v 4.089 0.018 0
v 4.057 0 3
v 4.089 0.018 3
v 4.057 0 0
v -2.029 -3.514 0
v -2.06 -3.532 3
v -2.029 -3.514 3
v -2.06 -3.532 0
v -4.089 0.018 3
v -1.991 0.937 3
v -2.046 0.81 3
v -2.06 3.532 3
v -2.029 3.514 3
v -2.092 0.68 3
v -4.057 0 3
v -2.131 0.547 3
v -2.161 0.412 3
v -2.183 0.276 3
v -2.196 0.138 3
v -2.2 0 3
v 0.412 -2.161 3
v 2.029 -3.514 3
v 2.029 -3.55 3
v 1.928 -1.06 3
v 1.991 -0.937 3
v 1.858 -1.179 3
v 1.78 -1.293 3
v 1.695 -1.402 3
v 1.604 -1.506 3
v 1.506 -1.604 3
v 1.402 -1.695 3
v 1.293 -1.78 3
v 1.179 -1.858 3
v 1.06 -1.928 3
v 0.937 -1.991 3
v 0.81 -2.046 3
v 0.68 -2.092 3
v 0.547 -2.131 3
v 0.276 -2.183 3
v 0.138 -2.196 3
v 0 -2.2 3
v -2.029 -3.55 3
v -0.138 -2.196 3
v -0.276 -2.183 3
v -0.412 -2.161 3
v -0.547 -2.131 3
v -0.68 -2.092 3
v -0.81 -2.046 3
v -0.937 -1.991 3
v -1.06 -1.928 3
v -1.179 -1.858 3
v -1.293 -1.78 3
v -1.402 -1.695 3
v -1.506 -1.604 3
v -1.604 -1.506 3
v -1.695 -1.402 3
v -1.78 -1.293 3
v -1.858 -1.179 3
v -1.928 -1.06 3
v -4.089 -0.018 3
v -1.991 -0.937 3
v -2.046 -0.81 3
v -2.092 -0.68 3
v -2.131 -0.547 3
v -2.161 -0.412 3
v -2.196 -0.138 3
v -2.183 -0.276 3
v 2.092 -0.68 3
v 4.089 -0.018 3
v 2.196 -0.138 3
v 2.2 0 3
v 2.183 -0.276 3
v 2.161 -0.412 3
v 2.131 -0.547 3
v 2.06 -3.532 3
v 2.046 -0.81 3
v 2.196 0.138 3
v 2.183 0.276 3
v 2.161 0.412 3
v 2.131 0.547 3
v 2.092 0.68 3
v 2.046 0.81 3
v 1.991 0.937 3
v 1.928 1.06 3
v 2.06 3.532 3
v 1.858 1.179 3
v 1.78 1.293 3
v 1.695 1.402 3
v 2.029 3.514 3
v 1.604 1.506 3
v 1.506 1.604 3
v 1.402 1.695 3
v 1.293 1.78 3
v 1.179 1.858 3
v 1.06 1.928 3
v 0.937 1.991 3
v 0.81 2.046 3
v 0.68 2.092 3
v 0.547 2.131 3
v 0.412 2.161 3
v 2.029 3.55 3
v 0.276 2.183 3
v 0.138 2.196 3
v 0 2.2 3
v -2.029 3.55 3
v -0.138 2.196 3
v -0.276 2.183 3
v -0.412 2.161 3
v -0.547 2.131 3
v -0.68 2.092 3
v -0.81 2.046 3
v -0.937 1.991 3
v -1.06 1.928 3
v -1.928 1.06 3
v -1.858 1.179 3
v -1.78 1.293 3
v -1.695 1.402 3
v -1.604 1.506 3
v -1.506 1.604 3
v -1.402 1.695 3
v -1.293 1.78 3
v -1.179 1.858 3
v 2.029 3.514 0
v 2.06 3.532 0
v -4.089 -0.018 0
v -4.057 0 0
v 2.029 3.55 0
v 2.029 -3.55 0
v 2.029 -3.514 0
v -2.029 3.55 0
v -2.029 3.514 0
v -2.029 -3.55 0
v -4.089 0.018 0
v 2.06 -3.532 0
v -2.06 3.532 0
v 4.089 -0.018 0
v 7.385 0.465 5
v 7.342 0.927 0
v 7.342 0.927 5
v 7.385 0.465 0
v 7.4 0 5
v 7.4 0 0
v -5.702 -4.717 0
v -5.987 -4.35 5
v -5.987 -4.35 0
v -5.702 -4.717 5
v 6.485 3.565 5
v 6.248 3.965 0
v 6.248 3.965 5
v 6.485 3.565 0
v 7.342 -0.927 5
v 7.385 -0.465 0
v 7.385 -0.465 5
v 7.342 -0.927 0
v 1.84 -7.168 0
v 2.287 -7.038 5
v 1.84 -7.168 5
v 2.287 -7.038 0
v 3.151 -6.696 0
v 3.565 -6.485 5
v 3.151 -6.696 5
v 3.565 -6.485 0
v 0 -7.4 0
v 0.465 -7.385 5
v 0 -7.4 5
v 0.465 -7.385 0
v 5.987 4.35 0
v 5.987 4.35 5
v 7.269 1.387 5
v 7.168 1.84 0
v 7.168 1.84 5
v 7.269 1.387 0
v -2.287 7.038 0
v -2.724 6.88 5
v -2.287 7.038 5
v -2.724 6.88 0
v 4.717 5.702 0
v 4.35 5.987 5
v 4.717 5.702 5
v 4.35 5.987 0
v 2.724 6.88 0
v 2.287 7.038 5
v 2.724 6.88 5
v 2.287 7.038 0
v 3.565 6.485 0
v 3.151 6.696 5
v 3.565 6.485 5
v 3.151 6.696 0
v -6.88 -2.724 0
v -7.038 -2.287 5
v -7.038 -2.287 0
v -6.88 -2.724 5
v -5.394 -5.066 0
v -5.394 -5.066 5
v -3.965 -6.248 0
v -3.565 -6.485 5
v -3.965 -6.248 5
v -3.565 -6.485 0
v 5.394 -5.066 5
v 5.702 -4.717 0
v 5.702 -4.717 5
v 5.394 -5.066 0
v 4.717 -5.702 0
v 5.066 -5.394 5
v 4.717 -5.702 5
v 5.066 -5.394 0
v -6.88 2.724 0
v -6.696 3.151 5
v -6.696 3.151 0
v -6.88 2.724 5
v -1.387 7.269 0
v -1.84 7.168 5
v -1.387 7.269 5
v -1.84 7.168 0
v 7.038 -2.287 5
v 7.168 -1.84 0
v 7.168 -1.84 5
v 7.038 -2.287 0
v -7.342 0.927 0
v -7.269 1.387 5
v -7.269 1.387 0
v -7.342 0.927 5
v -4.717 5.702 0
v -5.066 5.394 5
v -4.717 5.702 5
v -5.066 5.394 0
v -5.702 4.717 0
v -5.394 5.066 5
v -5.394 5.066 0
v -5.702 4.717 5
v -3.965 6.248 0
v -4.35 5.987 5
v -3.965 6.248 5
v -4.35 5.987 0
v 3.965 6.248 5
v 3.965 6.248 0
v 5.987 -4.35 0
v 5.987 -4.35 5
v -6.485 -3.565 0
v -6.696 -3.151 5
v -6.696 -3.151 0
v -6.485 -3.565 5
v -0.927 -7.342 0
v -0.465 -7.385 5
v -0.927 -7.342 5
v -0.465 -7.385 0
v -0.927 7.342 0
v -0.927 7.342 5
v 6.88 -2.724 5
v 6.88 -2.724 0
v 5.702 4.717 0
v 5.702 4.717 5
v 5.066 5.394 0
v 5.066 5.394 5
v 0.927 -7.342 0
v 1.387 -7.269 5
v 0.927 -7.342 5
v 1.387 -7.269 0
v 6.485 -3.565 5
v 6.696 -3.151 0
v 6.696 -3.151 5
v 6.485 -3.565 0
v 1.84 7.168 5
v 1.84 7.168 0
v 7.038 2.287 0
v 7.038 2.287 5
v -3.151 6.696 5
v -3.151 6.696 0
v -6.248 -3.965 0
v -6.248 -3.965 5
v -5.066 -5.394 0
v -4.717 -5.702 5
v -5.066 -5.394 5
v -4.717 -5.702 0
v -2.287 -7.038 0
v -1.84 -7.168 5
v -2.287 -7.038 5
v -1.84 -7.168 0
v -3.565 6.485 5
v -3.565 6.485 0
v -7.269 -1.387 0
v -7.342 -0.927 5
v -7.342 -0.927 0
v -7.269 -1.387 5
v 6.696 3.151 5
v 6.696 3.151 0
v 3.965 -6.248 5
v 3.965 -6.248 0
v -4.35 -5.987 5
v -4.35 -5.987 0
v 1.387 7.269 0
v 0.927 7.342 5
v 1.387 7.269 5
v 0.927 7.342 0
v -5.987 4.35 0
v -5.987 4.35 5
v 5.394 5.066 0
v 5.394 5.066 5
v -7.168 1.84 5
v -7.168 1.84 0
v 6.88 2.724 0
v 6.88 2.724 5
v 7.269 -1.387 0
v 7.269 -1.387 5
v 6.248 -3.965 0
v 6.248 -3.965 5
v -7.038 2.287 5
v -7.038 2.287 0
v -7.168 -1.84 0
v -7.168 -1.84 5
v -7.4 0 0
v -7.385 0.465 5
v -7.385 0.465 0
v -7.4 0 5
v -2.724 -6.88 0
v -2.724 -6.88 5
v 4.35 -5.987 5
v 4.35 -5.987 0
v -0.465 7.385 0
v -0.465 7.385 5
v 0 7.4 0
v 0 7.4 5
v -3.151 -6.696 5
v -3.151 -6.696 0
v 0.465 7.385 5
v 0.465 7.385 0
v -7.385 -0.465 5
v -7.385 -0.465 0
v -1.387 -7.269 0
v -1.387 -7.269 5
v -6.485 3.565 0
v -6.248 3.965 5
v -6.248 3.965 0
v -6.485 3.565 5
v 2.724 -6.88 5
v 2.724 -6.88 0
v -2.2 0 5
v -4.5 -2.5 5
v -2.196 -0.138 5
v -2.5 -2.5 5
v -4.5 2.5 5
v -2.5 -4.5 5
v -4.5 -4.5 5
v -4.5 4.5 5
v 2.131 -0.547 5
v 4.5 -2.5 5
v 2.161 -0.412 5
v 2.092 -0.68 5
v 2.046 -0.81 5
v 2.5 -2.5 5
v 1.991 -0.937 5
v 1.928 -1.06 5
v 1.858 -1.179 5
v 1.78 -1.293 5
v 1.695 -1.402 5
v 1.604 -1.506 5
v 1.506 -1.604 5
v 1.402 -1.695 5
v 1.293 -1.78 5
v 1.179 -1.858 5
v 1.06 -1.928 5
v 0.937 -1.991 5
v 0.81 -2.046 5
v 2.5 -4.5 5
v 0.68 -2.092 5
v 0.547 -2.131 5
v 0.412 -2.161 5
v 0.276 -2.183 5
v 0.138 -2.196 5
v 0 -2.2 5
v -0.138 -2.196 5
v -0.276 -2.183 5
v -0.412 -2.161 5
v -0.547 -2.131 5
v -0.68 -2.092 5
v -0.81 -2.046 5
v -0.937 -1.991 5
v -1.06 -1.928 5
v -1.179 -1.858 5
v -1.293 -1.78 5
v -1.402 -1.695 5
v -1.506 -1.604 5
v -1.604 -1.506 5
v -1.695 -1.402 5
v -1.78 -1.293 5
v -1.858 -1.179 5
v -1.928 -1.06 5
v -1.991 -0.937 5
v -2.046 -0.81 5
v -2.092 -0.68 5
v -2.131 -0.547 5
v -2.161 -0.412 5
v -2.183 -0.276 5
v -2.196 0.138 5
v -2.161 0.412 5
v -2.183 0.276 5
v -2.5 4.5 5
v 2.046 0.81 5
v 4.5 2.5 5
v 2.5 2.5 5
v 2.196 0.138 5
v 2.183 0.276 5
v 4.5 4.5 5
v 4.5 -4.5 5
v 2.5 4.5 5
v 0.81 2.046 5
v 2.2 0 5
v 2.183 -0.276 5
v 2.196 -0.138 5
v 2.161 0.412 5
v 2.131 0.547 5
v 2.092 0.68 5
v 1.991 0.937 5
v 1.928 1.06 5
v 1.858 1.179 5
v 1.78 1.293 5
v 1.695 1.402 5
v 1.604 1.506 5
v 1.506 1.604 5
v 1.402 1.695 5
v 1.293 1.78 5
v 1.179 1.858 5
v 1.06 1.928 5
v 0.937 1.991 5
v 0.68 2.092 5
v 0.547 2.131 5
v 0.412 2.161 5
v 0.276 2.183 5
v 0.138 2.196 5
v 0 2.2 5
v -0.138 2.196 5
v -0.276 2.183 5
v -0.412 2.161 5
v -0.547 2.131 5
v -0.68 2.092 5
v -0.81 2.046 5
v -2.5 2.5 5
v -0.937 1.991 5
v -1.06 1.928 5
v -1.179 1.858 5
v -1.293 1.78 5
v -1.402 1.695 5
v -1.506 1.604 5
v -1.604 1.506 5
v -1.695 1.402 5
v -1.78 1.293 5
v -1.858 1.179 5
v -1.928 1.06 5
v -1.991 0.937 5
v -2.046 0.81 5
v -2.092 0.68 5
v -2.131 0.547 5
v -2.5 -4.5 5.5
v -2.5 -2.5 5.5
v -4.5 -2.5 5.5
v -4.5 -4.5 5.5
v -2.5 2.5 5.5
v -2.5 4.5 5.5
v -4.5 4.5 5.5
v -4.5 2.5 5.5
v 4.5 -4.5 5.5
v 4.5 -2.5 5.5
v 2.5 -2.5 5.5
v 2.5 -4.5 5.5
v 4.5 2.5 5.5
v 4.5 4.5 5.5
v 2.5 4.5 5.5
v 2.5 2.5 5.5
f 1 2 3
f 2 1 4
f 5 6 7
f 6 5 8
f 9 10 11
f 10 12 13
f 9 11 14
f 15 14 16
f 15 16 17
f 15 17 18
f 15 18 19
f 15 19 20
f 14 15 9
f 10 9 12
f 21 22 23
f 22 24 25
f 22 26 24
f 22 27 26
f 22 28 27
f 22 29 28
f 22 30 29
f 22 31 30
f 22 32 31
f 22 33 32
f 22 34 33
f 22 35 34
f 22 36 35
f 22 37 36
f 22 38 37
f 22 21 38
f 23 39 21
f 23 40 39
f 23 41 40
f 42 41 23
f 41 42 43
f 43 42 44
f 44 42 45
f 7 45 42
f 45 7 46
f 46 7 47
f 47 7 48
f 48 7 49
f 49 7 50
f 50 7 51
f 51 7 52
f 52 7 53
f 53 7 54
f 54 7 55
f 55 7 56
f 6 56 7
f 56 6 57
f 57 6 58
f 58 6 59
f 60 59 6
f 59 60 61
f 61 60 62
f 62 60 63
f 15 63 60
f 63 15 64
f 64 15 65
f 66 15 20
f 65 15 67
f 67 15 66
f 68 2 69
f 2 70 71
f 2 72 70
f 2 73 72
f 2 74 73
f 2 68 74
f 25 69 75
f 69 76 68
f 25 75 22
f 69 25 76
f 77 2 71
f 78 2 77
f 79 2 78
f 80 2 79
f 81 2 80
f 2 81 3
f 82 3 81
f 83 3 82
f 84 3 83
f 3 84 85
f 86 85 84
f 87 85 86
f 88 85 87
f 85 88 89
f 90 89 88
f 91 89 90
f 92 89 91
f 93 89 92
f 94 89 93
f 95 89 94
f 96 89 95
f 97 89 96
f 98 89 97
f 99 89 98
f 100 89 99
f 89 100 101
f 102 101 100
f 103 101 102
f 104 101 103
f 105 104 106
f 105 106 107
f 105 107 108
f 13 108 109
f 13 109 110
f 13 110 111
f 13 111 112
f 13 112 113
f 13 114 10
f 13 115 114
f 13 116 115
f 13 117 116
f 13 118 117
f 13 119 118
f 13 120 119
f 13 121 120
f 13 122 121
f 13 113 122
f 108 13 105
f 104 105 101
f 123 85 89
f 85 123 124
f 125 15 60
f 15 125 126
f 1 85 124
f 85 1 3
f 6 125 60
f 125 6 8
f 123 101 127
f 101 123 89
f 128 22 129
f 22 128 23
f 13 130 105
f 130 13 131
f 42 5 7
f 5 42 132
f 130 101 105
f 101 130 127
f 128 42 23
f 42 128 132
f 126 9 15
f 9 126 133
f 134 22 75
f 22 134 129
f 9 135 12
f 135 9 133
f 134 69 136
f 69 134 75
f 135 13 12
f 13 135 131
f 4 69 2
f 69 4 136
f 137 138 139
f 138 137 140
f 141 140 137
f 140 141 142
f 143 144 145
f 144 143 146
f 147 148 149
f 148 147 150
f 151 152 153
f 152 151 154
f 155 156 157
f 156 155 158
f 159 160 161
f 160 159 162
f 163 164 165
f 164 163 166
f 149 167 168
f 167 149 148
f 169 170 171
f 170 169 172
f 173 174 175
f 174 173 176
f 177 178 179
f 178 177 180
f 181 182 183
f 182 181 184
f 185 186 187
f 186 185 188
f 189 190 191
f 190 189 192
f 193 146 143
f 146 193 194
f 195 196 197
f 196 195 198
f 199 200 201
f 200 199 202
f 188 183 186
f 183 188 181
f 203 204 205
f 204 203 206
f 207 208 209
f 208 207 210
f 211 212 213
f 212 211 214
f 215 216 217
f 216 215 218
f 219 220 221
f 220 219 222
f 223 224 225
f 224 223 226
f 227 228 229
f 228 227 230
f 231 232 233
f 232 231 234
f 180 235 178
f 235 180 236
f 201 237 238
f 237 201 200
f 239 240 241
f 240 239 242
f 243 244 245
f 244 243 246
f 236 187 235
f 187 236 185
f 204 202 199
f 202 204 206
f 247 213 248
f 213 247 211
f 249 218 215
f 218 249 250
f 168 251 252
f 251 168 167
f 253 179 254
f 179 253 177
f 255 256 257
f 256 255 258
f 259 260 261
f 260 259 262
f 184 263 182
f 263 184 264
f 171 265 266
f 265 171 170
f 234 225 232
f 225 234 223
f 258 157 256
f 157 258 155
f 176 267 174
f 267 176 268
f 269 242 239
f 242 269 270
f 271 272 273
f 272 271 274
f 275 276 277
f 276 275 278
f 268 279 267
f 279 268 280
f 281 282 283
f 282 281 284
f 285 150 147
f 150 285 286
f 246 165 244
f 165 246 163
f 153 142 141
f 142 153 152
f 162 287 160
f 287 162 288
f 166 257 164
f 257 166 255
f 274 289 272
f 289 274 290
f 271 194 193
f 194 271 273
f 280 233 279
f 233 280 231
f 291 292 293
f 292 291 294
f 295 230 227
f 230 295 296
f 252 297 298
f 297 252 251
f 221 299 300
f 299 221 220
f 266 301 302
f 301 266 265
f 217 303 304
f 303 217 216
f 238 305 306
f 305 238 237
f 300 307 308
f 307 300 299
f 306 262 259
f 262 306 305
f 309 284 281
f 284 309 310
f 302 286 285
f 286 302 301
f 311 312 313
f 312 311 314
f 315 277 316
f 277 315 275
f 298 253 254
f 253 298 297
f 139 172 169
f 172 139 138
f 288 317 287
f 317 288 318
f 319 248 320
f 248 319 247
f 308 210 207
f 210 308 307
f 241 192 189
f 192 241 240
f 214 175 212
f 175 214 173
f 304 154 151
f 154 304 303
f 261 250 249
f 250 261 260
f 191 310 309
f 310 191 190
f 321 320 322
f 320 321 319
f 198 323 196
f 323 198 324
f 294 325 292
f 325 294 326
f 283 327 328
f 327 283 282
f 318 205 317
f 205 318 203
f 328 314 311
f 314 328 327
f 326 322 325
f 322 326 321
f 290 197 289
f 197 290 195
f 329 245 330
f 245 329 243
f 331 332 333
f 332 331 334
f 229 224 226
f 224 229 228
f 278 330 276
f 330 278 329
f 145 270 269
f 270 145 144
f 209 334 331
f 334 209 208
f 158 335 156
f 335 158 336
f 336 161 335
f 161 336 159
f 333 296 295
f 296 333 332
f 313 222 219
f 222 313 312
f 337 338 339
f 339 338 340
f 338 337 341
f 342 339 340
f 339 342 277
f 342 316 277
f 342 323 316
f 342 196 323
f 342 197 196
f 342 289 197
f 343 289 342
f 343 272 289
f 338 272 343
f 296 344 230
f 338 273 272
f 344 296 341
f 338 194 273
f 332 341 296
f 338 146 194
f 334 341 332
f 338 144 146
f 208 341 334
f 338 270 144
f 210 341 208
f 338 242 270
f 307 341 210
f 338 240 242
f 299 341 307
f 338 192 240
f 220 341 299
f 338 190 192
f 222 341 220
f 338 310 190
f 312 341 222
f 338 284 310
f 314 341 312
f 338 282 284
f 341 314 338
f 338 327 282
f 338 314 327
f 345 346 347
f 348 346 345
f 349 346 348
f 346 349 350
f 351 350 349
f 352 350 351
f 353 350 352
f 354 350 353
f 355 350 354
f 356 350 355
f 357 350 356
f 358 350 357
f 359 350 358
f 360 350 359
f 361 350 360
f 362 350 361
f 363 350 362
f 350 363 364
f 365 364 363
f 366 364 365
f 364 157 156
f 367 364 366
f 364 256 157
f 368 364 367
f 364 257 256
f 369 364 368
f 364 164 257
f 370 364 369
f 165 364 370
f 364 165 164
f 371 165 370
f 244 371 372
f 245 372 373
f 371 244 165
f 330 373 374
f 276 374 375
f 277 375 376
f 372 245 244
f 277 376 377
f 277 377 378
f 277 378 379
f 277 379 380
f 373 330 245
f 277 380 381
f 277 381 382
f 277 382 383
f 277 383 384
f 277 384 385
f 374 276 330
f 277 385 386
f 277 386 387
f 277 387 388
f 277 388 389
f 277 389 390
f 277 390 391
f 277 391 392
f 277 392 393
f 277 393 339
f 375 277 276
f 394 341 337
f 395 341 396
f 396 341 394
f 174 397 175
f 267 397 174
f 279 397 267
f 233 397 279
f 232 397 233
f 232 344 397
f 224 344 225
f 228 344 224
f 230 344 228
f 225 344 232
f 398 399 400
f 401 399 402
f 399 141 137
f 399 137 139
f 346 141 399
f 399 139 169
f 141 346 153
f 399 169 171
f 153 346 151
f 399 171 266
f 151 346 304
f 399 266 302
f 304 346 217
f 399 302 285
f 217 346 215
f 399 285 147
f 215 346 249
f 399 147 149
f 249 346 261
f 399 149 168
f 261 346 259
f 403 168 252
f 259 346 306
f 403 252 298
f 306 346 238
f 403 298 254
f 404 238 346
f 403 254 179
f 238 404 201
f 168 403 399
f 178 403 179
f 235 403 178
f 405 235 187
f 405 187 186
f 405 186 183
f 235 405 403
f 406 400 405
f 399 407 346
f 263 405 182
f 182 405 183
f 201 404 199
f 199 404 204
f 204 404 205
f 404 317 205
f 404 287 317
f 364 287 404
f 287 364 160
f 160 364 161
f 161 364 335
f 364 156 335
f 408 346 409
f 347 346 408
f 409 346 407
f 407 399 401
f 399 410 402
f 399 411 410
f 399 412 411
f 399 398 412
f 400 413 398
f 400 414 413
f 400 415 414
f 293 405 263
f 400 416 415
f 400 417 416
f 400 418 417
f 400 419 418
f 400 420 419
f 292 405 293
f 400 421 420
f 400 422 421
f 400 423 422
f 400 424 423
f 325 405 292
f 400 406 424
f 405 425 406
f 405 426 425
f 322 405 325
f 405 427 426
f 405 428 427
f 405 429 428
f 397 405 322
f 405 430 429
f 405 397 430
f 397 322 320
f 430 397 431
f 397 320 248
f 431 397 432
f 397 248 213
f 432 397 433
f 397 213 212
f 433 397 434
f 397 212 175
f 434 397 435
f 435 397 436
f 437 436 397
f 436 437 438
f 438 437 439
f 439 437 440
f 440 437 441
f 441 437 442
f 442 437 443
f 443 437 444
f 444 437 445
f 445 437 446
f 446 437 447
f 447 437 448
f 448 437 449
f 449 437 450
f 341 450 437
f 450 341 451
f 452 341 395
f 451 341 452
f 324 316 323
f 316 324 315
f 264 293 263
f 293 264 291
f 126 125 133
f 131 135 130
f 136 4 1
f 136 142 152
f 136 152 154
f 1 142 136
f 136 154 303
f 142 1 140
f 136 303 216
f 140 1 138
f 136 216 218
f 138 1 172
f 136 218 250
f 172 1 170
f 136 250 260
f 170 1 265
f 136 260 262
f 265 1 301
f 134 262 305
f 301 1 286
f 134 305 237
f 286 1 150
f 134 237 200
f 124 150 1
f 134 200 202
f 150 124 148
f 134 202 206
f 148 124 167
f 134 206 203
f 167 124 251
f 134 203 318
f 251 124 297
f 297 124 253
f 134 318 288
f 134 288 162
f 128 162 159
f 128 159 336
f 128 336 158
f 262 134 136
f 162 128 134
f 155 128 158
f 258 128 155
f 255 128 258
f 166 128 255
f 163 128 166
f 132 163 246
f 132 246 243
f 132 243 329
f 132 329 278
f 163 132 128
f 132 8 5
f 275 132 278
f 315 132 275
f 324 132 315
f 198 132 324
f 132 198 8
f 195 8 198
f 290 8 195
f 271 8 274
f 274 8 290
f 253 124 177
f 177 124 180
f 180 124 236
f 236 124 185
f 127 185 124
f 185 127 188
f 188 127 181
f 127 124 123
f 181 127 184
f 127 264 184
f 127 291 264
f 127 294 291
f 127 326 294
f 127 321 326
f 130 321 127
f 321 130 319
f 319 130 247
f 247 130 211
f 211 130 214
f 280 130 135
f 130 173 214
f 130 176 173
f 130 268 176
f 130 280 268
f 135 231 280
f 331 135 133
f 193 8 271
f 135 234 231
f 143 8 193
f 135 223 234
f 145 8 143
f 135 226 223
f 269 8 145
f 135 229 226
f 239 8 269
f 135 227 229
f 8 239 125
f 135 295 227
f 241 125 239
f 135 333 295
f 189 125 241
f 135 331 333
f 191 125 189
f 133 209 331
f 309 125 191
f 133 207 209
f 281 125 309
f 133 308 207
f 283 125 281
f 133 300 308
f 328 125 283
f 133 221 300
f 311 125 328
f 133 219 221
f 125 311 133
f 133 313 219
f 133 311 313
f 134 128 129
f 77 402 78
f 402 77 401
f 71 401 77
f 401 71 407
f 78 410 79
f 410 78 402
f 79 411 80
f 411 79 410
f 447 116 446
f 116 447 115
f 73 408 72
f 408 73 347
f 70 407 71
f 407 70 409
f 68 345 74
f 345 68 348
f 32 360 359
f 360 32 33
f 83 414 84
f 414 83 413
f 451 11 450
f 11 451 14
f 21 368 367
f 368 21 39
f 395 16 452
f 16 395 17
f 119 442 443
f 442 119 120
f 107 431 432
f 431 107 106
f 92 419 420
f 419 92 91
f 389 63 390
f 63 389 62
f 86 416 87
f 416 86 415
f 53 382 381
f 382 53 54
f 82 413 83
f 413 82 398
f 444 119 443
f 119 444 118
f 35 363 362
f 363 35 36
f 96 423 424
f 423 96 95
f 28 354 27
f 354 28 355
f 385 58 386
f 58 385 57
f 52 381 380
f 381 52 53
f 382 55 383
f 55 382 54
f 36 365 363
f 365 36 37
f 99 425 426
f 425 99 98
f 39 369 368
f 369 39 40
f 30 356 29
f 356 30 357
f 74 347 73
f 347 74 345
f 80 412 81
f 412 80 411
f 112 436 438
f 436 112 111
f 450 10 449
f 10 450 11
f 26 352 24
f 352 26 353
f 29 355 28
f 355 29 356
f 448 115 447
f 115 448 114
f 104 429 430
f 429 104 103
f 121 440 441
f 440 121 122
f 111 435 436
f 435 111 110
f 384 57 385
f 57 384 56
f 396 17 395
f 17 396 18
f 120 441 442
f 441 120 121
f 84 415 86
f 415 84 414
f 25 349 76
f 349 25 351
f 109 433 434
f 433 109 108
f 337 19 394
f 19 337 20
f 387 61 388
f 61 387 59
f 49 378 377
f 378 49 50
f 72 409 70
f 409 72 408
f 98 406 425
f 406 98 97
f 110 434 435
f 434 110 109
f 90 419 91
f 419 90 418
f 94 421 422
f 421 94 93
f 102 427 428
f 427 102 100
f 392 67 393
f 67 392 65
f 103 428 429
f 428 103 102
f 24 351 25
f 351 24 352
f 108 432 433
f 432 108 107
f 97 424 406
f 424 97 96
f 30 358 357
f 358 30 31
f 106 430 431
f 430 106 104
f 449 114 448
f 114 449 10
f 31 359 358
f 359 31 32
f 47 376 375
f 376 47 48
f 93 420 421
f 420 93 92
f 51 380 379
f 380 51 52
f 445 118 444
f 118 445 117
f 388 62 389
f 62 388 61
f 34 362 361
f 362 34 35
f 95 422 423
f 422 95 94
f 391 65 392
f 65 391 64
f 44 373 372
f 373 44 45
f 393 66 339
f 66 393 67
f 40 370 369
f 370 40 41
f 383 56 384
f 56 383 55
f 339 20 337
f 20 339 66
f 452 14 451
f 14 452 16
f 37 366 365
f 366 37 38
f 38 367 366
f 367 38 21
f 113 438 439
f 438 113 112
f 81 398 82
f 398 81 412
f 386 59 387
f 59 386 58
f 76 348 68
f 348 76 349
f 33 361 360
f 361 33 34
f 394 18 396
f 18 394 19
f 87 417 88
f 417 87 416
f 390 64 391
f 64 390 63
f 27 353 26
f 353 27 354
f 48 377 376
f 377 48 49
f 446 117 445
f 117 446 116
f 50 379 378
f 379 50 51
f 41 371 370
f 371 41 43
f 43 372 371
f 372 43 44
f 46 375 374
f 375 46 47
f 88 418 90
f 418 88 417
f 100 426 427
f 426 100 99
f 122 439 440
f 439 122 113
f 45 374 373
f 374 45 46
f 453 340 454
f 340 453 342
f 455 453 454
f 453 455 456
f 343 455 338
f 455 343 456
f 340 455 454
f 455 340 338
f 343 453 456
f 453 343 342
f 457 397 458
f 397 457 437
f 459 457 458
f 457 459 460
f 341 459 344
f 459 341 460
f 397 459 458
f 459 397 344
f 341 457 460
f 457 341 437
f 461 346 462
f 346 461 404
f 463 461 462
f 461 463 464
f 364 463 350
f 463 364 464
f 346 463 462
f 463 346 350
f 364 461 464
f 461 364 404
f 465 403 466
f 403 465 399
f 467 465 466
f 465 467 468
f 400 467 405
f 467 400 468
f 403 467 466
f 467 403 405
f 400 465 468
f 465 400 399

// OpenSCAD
module hexagon(size, height) {
  boxWidth = size/1.75;
  for (r = [-60, 0, 60]) rotate([0,0,r]) cube([boxWidth, size, height], true);
}

difference() {
cylinder($fn = 100, 5, 7.4, 7.4);
hexagon(7.1,6);
translate([0,0,-1])
cylinder($fn = 100, 7, 2.2, 2.2);
}

for(i = [-3.5 : 7 : 3.5])
for(j = [-3.5 : 7 : 3.5])
translate([i,j,5])
cube([2, 2, 1], center=true);
